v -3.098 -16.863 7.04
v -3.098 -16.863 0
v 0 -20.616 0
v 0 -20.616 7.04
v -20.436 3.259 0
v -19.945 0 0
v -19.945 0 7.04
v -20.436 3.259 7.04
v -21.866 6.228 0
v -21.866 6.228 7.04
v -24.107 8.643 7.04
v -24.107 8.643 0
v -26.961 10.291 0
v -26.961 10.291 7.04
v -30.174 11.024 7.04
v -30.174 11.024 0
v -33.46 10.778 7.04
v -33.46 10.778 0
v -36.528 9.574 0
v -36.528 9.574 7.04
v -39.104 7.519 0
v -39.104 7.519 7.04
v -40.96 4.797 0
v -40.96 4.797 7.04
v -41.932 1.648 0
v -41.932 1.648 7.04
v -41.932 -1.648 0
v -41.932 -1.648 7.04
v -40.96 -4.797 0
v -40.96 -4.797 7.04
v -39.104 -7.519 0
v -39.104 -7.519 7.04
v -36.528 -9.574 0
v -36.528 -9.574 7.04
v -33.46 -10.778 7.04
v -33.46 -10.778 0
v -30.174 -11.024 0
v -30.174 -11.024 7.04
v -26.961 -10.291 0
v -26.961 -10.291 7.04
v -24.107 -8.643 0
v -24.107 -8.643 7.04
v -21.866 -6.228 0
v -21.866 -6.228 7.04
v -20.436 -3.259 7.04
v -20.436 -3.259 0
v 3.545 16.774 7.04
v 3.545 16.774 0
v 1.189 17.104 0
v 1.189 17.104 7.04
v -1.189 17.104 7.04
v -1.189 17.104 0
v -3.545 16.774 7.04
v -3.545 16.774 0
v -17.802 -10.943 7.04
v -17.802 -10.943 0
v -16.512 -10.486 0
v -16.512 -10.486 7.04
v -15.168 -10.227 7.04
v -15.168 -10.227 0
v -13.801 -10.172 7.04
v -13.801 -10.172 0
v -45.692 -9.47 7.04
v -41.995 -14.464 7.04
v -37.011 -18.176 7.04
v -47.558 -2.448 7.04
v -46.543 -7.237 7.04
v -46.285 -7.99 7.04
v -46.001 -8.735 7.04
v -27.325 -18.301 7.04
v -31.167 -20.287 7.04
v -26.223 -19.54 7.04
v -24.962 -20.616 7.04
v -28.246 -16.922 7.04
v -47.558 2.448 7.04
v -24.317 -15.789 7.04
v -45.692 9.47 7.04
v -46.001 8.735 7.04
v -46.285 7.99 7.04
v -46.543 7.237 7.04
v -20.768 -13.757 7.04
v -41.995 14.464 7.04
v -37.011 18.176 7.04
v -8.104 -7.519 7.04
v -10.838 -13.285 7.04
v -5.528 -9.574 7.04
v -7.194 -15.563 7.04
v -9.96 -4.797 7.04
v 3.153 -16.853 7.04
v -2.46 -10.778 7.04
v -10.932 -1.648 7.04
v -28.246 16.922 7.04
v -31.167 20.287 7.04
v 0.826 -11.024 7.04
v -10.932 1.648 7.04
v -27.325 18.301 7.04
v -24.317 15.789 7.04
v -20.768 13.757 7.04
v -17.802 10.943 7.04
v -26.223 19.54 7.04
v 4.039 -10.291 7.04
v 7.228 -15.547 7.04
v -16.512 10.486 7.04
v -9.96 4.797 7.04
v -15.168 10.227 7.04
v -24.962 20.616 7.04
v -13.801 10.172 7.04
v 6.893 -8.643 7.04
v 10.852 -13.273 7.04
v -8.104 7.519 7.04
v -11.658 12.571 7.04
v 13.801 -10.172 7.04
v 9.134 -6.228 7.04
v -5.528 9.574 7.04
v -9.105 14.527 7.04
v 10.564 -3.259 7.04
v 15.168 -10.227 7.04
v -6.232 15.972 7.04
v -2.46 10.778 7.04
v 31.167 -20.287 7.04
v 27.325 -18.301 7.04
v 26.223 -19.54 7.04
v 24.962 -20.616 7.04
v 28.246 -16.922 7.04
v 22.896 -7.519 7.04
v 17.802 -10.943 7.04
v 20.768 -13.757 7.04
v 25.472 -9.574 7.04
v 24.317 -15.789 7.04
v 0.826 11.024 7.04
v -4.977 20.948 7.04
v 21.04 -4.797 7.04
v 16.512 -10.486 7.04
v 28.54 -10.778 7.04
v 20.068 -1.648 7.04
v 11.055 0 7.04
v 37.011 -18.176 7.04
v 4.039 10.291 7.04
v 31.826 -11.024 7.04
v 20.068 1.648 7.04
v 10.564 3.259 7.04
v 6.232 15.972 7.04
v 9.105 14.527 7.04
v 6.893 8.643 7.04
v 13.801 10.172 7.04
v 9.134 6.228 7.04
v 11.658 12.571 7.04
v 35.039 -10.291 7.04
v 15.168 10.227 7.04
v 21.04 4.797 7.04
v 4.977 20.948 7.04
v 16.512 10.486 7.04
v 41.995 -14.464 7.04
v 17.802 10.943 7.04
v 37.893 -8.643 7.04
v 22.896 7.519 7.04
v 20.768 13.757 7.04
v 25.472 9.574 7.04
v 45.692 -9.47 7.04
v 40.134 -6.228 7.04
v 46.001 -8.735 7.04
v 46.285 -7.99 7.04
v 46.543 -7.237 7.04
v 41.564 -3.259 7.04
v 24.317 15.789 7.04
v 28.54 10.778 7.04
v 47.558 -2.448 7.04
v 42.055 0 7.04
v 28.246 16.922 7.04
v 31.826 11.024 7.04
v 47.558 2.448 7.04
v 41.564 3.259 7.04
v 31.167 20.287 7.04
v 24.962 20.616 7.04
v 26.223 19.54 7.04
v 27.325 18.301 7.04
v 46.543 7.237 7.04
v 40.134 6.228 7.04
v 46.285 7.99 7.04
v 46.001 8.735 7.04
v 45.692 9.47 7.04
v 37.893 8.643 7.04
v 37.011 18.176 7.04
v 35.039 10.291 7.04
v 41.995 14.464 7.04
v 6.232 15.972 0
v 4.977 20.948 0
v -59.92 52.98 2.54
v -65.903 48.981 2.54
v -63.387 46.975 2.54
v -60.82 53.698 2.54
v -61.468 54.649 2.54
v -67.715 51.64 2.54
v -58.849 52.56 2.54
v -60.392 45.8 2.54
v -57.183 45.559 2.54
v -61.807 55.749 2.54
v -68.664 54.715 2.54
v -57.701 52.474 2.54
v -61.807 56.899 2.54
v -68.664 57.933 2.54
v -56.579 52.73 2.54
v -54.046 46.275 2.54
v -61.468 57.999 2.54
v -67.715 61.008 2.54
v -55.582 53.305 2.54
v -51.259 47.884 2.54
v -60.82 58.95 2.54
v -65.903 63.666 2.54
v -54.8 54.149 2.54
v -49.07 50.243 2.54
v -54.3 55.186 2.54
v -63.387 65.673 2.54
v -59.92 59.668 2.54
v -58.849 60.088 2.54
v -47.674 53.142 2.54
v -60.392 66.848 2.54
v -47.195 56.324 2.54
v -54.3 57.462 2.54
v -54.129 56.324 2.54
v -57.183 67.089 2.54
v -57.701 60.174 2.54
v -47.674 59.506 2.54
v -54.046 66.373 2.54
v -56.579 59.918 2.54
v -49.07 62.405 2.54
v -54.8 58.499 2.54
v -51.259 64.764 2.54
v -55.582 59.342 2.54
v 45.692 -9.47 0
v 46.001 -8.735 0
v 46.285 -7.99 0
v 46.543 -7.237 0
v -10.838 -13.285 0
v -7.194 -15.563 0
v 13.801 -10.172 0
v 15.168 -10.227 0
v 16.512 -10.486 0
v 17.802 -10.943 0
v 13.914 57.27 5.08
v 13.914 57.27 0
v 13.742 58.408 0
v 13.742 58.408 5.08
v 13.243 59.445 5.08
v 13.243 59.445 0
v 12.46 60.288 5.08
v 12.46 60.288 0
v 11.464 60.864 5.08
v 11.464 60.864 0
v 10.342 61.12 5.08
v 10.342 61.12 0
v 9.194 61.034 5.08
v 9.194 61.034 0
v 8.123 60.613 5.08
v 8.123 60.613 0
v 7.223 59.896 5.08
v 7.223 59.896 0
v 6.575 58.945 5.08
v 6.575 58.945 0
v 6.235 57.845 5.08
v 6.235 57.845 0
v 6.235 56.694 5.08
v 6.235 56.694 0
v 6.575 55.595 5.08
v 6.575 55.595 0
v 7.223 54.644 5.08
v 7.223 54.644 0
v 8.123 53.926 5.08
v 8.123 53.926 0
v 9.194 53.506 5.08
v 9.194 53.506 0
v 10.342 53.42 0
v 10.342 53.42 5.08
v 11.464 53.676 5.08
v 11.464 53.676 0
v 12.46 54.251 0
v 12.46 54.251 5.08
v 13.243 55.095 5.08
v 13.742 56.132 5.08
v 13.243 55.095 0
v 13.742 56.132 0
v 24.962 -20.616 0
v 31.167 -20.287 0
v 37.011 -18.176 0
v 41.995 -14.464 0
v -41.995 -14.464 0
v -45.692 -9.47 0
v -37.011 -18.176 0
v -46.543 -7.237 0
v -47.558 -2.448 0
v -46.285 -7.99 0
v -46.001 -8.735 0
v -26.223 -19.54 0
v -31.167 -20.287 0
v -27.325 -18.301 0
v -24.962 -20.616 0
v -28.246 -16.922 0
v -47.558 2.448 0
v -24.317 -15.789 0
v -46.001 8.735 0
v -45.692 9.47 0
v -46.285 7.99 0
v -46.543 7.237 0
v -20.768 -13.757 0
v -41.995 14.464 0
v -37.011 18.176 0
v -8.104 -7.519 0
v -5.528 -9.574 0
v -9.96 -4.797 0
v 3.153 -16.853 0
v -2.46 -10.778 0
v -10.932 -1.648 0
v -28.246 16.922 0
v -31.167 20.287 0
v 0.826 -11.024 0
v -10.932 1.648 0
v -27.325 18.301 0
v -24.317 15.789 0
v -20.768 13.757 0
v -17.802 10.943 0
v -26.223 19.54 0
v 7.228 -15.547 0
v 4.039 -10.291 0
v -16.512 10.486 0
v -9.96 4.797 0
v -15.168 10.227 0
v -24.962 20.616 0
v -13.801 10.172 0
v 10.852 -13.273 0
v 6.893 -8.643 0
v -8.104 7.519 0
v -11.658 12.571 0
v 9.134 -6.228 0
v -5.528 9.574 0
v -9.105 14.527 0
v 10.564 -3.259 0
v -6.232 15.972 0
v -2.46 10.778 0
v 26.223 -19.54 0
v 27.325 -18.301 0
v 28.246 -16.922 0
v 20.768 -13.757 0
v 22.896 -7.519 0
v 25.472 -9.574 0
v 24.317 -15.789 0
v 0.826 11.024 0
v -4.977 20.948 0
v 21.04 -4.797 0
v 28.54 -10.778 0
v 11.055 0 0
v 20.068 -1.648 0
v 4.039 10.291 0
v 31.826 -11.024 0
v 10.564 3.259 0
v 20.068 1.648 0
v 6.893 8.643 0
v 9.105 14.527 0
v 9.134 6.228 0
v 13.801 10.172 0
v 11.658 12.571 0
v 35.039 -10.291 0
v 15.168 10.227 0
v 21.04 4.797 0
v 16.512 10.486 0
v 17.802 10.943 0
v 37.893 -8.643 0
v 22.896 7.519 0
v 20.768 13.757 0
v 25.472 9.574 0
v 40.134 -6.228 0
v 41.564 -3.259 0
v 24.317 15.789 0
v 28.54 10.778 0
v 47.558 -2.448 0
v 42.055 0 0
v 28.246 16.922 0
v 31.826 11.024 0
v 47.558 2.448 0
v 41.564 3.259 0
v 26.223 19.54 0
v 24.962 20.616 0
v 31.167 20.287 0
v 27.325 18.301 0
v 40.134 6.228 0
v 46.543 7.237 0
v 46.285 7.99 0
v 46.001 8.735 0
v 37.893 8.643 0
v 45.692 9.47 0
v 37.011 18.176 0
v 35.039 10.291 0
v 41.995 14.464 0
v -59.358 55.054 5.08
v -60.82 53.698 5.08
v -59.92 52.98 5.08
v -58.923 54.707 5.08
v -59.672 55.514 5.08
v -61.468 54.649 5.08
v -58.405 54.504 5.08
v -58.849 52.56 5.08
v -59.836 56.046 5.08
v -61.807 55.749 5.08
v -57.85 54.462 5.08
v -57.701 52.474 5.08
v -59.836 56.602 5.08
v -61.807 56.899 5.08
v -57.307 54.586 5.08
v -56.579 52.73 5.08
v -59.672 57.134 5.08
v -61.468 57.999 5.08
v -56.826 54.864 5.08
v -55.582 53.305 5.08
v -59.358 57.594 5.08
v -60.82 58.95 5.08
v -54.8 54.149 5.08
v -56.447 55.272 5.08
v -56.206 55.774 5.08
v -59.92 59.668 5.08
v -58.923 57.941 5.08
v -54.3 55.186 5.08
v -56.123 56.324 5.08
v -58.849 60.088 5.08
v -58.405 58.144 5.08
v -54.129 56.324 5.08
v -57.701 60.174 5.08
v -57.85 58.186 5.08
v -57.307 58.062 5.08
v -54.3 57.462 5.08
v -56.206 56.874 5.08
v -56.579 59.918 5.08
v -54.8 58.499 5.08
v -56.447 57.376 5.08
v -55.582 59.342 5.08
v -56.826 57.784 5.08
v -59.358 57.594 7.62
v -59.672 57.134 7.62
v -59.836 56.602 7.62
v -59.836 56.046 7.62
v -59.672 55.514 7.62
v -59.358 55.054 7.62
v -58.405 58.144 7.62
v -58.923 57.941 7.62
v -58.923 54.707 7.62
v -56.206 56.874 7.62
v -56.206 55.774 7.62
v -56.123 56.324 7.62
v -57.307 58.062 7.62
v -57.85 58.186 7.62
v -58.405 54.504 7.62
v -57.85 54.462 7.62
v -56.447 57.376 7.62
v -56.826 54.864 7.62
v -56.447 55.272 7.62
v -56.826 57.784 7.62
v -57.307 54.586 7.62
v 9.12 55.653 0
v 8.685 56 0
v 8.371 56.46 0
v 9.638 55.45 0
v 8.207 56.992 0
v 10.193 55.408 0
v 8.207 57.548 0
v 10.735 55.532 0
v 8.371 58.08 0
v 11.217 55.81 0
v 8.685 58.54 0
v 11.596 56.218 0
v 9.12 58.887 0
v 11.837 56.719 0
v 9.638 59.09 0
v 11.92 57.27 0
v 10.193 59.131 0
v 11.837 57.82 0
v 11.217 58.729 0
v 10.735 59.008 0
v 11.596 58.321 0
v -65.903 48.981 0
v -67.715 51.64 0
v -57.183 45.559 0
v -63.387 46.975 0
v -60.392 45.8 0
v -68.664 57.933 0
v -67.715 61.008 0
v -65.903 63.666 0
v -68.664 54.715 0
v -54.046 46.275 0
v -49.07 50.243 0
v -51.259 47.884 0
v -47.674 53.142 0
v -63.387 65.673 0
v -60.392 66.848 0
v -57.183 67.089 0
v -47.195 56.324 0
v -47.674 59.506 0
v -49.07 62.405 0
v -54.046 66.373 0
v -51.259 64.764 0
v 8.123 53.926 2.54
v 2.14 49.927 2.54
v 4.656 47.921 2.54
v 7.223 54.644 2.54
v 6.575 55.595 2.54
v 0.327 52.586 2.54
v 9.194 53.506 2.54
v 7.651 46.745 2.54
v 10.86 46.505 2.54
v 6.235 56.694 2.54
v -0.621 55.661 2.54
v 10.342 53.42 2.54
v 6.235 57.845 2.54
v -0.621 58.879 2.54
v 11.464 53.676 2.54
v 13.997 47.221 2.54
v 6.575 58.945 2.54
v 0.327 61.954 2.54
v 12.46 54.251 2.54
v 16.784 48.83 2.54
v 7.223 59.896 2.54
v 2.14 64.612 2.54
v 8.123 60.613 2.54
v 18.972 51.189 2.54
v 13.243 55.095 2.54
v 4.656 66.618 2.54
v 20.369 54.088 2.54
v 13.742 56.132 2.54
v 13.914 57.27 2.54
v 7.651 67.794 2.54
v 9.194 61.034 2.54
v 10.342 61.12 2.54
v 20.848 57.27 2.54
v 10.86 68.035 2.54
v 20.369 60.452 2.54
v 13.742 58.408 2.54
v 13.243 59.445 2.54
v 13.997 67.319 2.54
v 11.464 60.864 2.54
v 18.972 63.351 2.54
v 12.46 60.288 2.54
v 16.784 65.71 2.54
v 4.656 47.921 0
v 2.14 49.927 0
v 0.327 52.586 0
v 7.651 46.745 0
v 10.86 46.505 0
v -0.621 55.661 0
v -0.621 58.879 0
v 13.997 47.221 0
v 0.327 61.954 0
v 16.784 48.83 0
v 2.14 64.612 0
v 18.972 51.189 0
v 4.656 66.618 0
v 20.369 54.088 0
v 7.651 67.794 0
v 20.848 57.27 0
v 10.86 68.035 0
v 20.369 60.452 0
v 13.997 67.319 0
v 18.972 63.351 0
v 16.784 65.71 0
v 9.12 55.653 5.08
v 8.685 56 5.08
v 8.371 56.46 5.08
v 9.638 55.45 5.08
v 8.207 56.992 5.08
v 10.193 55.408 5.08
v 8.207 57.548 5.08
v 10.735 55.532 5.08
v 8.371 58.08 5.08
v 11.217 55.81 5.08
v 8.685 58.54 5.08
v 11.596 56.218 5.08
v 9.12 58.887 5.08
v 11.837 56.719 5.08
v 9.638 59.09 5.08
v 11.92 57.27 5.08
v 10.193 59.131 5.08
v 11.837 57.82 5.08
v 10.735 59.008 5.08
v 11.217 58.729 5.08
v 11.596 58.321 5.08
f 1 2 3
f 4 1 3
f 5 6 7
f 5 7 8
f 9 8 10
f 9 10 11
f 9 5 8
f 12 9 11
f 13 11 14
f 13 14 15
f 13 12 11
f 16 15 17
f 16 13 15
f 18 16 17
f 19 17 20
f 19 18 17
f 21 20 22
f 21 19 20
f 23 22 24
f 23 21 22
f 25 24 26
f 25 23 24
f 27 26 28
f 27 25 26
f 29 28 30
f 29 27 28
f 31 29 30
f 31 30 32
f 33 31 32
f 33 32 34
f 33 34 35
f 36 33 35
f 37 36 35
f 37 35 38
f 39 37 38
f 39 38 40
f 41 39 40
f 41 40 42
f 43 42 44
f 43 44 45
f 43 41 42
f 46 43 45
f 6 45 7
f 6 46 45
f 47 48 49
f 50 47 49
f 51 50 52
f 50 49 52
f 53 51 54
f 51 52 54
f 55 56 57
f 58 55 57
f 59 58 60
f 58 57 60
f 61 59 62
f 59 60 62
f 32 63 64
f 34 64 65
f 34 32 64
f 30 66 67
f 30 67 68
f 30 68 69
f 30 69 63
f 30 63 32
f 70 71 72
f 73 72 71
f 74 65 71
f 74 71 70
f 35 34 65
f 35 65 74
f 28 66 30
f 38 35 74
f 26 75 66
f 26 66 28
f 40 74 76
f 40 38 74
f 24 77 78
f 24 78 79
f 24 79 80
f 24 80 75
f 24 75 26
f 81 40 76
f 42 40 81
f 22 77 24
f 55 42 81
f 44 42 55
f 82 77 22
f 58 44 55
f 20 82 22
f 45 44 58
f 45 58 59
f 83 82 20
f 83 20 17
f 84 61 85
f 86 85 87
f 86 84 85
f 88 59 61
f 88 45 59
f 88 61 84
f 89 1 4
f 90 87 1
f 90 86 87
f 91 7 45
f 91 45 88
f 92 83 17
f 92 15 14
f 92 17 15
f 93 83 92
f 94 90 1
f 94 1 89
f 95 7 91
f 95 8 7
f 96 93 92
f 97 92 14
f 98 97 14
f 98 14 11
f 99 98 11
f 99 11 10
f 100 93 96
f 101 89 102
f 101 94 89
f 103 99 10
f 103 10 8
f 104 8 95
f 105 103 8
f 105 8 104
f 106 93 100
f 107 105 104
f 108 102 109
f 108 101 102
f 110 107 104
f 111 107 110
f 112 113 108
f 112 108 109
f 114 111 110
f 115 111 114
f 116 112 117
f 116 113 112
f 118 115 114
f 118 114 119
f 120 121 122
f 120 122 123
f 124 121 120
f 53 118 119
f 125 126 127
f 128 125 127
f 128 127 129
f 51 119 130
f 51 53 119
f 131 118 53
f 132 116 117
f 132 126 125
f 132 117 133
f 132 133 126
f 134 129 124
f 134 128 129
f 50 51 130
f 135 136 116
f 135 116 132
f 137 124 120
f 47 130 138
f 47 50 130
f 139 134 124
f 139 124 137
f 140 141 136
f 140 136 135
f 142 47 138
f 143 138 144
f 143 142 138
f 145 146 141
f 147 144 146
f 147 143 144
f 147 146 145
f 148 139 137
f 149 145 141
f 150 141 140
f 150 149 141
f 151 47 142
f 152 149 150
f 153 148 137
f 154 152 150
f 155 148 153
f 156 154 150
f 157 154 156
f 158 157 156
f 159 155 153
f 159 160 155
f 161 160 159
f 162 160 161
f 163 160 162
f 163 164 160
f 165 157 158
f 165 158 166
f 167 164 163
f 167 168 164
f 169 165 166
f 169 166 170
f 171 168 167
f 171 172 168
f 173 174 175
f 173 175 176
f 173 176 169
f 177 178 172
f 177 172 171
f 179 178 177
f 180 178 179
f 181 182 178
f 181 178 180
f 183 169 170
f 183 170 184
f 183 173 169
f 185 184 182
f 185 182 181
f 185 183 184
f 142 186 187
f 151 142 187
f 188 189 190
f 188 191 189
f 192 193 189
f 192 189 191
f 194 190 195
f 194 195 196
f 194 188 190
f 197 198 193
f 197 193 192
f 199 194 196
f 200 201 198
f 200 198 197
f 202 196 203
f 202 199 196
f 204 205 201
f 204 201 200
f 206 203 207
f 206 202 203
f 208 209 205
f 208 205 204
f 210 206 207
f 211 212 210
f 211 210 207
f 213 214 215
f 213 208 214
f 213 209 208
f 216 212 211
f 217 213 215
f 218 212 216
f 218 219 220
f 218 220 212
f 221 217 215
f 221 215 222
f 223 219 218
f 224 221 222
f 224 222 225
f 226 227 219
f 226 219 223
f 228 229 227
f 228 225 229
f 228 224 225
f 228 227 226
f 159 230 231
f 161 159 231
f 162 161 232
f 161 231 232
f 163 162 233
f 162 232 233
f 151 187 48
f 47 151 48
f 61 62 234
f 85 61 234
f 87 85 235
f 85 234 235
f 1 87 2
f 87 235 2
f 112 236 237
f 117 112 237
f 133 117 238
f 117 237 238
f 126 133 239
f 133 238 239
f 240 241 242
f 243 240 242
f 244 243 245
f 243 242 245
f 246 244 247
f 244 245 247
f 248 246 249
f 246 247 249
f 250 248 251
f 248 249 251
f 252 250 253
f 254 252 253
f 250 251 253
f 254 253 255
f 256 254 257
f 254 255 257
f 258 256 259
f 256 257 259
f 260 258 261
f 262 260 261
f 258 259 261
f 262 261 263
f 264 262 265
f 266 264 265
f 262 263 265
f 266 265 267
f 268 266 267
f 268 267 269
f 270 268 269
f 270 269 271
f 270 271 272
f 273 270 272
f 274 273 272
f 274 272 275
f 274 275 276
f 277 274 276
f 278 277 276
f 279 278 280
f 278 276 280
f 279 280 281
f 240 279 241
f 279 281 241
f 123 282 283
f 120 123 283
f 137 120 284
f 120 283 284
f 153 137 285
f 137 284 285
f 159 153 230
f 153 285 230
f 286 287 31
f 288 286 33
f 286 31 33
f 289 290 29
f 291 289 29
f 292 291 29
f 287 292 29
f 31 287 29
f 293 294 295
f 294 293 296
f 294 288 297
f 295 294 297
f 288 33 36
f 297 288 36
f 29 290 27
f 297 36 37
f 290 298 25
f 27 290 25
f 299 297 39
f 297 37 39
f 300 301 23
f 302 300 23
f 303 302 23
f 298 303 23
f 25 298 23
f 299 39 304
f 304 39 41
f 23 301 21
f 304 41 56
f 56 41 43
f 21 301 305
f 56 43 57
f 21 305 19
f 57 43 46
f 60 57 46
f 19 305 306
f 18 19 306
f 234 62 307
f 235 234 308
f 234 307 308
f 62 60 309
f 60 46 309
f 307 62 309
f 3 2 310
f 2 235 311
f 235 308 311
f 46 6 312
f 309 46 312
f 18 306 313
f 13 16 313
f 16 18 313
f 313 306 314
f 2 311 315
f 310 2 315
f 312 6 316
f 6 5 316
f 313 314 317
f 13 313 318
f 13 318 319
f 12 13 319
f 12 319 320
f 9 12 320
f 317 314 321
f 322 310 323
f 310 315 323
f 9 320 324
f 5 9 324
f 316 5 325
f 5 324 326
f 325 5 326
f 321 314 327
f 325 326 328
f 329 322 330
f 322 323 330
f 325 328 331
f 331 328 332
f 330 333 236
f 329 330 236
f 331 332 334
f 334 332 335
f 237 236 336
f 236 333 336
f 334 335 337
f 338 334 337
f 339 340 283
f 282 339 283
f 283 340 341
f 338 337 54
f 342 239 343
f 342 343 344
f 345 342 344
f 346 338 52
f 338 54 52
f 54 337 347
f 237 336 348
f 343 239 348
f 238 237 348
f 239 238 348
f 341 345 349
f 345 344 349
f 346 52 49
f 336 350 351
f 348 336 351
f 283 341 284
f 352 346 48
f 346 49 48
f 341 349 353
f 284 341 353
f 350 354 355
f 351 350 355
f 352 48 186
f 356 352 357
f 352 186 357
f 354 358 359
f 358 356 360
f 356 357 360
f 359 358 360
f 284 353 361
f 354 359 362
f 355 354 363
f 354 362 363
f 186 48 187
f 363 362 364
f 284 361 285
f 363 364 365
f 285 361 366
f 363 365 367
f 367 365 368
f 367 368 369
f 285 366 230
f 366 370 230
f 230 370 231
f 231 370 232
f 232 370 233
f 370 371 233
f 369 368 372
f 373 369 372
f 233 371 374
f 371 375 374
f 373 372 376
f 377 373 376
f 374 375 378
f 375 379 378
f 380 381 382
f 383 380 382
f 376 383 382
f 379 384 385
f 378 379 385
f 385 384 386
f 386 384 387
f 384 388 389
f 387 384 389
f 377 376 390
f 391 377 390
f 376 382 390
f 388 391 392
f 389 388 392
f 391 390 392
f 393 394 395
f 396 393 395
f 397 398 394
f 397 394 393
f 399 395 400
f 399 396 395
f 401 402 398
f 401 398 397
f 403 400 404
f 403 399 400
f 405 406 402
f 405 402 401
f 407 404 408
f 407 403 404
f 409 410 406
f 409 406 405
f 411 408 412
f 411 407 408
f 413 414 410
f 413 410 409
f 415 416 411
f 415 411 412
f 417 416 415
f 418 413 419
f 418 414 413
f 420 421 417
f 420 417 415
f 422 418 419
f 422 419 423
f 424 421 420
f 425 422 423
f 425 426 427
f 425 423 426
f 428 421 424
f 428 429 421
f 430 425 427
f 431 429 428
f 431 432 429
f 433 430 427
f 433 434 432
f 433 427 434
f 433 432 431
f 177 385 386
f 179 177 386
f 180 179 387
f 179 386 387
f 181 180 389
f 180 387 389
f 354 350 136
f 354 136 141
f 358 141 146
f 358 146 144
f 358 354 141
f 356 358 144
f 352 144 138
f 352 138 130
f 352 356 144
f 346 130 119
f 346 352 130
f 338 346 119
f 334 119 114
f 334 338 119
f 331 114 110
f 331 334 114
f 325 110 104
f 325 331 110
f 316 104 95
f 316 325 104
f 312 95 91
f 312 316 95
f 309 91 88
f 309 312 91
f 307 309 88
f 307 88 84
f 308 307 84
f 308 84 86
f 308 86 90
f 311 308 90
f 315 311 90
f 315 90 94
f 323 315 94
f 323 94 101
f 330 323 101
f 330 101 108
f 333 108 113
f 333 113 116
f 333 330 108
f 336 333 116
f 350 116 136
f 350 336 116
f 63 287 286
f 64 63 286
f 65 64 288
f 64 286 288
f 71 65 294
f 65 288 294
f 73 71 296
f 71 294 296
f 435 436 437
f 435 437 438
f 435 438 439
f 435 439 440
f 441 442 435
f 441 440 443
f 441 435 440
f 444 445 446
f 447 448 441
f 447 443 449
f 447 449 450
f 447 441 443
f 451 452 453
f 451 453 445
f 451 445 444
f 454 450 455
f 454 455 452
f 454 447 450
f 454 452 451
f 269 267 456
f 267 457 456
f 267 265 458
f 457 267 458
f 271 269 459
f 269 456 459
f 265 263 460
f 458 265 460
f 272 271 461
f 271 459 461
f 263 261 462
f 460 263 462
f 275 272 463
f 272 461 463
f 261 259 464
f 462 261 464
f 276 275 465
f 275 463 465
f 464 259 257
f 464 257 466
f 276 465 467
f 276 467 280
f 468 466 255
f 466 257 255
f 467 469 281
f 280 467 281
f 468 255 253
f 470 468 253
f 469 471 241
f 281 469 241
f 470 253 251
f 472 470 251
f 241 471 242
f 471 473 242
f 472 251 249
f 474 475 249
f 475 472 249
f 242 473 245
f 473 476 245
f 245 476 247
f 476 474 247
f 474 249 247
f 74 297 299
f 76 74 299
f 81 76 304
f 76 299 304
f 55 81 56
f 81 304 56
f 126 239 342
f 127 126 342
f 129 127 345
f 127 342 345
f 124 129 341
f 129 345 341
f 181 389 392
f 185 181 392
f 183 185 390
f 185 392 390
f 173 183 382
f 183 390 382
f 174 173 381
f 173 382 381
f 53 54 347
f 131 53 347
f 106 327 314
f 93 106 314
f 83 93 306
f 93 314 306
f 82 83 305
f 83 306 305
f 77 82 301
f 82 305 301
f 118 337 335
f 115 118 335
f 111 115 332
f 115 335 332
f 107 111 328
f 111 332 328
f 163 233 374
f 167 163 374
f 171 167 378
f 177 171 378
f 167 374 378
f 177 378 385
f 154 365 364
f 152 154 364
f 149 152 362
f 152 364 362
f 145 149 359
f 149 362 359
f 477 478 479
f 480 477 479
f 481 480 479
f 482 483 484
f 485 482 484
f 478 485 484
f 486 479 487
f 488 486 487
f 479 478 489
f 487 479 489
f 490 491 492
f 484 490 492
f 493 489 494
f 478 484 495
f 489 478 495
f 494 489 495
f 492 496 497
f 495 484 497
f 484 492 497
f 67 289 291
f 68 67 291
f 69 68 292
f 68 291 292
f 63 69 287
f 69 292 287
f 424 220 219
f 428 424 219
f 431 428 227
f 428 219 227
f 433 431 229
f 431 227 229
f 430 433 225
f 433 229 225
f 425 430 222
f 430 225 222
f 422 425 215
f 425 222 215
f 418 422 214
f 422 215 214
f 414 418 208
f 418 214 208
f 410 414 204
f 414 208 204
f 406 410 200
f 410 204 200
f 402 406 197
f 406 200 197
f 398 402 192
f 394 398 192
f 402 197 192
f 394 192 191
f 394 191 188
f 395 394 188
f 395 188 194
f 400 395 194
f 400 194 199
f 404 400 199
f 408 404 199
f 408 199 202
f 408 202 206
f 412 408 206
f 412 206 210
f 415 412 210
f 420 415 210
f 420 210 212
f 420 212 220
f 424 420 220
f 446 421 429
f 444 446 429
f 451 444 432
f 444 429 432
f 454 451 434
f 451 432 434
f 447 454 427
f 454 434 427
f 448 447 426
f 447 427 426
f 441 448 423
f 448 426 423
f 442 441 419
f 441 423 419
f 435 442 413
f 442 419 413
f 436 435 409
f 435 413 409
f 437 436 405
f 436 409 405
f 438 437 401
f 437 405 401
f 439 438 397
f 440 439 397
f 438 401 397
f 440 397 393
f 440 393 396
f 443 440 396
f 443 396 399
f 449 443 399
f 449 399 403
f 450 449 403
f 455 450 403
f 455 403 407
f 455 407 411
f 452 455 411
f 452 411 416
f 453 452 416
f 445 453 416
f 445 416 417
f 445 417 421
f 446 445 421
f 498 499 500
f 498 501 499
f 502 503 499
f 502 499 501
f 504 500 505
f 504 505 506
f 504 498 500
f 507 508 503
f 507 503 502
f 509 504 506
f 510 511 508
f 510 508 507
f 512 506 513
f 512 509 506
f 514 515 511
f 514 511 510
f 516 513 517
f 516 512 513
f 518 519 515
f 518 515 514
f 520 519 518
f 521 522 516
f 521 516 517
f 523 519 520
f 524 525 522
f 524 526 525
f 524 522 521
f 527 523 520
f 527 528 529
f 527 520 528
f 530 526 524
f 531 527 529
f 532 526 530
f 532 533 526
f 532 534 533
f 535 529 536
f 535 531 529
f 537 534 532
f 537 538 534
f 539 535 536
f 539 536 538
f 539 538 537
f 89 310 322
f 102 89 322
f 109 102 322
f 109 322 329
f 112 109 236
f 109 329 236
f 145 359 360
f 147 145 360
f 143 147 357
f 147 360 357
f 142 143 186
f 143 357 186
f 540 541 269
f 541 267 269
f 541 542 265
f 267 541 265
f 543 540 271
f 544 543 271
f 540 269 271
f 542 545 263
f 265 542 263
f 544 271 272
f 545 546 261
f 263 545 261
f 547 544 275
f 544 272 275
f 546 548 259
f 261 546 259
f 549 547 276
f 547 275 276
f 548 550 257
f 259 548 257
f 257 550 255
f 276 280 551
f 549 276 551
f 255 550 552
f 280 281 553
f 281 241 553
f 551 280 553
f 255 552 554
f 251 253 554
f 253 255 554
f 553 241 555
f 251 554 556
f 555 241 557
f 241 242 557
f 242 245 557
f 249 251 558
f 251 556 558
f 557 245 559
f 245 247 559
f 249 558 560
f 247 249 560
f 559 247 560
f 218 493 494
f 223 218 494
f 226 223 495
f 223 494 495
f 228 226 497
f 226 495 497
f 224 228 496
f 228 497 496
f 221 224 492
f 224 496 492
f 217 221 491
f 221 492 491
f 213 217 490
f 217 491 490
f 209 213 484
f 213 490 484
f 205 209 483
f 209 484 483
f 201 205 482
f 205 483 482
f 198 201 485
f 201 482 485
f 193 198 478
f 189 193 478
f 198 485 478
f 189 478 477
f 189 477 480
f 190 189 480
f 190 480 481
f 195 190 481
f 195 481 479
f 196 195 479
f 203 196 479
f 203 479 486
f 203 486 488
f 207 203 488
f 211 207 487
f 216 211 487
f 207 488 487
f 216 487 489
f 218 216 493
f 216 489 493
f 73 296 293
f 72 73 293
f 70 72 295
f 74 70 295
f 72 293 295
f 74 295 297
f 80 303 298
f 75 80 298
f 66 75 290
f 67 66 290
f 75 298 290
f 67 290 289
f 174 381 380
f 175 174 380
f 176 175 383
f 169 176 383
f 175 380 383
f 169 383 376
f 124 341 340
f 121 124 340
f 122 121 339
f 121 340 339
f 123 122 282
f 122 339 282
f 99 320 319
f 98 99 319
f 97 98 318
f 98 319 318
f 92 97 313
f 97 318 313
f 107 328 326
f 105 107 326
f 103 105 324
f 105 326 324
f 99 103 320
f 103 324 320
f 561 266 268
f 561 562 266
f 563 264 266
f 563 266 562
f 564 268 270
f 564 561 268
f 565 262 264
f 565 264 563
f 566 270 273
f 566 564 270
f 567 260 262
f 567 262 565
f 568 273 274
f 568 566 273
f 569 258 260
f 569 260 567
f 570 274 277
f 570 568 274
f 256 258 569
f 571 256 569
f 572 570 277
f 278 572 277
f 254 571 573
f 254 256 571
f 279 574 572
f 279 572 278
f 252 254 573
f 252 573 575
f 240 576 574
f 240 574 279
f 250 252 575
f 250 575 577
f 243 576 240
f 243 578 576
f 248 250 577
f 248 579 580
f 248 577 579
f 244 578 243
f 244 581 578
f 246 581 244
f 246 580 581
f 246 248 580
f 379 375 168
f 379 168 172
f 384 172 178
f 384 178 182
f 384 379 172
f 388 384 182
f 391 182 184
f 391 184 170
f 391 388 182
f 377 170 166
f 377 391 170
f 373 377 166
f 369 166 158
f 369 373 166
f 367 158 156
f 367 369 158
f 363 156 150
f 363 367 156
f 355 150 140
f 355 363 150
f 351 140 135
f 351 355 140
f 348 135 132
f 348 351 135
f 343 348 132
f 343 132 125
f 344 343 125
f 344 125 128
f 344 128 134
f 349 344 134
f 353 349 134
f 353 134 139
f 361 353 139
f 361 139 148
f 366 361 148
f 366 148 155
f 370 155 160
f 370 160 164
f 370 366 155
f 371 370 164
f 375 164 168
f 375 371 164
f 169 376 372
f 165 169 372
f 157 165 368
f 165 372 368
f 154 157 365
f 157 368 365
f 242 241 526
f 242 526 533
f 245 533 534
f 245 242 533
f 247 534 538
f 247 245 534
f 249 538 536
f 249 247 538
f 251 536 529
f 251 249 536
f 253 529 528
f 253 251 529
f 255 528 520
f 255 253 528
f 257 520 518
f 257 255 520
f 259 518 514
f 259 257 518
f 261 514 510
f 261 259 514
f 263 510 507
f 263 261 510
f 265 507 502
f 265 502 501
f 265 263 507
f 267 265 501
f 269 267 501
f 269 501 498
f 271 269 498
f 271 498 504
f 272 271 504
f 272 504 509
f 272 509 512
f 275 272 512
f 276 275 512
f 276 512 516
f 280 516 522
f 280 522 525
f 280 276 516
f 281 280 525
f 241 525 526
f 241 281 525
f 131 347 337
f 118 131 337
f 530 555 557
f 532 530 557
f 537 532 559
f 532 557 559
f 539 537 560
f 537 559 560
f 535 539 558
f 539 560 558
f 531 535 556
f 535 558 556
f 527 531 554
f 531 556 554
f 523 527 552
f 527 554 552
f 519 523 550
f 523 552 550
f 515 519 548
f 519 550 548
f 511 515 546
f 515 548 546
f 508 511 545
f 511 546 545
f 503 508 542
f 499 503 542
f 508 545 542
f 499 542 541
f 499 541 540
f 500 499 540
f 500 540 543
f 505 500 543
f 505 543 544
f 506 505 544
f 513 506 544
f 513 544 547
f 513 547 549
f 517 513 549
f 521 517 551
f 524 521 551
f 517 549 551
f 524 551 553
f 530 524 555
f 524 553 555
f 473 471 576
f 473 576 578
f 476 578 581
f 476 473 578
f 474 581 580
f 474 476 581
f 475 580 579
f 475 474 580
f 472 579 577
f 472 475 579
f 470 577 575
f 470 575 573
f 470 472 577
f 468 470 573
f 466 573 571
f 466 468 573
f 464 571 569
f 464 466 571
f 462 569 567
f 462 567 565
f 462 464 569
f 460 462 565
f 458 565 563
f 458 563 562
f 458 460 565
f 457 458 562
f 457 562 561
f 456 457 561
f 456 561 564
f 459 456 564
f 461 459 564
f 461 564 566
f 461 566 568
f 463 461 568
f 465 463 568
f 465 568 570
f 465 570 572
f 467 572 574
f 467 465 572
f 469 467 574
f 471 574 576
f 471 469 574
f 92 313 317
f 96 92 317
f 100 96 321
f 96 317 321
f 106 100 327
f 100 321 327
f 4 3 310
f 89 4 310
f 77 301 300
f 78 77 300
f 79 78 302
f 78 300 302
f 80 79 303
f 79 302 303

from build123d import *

# Parameters (mm, degrees)
F0_R     = 11.055
F1_DEPTH = 7.04
F2_R     = 3.8608
F2_R_2   = 1.8669
F3_DEPTH = 5.08
F2_R_3   = 10.795
F4_DEPTH = 2.54
F5_DEPTH = 7.62


with BuildPart() as f1:
    # F0 (on Top) → F1 (new body)
    with BuildSketch(Plane.XY):
        with BuildLine():
            ThreePointArc((-46.5429451347, 7.2365655902), (-39.0213444379, 15.1528564439), (-28.2458606842, 16.9223444484))
            ThreePointArc((-28.2458606842, 16.9223444484), (-26.7954522093, 18.9396770038), (-24.9616837395, 20.6161639804))
            ThreePointArc((-24.9616837395, 20.6161639804), (-37.0112899435, 18.1759091976), (-45.6916782608, 9.4696636386))
            ThreePointArc((-45.6916782608, 9.4696636386), (-46.1457401666, 8.3639516727), (-46.5429451347, 7.2365655902))
        make_face()
        with BuildLine():
            ThreePointArc((-28.2458606842, -16.9223444484), (-39.0213444379, -15.1528564439), (-46.5429451347, -7.2365655902))
            ThreePointArc((-46.5429451347, -7.2365655902), (-46.1457401666, -8.3639516727), (-45.6916782608, -9.4696636386))
            ThreePointArc((-45.6916782608, -9.4696636386), (-37.0112899435, -18.1759091976), (-24.9616837395, -20.6161639804))
            ThreePointArc((-24.9616837395, -20.6161639804), (-26.7954522093, -18.9396770038), (-28.2458606842, -16.9223444484))
        make_face()
        with BuildLine():
            ThreePointArc((-13.8011629931, 10.1724591441), (-15.8450830005, 10.3315929693), (-17.8017727644, 10.9433917429))
            ThreePointArc((-17.8017727644, 10.9433917429), (-16.5374743475, 9.2079518218), (-15.5, 7.3280983208))
            ThreePointArc((-15.5, 7.3280983208), (-14.7194475205, 8.7914099944), (-13.8011629931, 10.1724591441))
        make_face()
        with BuildLine():
            ThreePointArc((-13.855, 0), (-14.27130422, 3.7552313511), (-15.5, 7.3280983208))
            ThreePointArc((-15.5, 7.3280983208), (-17.145, 0), (-15.5, -7.3280983208))
            ThreePointArc((-15.5, -7.3280983208), (-14.27130422, -3.7552313511), (-13.855, 0))
        make_face()
        with BuildLine():
            ThreePointArc((-13.8011629931, -10.1724591441), (-14.7194475205, -8.7914099944), (-15.5, -7.3280983208))
            ThreePointArc((-15.5, -7.3280983208), (-16.5374743475, -9.2079518218), (-17.8017727644, -10.9433917429))
            ThreePointArc((-17.8017727644, -10.9433917429), (-15.8450830005, -10.3315929693), (-13.8011629931, -10.1724591441))
        make_face()
        with BuildLine():
            ThreePointArc((-13.8011629931, 10.1724591441), (-14.7194475205, 8.7914099944), (-15.5, 7.3280983208))
            ThreePointArc((-15.5, 7.3280983208), (-14.27130422, 3.7552313511), (-13.855, 0))
            ThreePointArc((-13.855, 0), (-14.27130422, -3.7552313511), (-15.5, -7.3280983208))
            ThreePointArc((-15.5, -7.3280983208), (-14.7194475205, -8.7914099944), (-13.8011629931, -10.1724591441))
            ThreePointArc((-13.8011629931, -10.1724591441), (-9.0876766021, -14.5384029032), (-3.0980425219, -16.862774313))
            ThreePointArc((-3.0980425219, -16.862774313), (0.0279613173, -17.1449771993), (3.1530280548, -16.8525795974))
            ThreePointArc((3.1530280548, -16.8525795974), (9.1113748051, -14.5235627227), (13.8011629931, -10.1724591441))
            ThreePointArc((13.8011629931, -10.1724591441), (14.7194475205, -8.7914099944), (15.5, -7.3280983208))
            ThreePointArc((15.5, -7.3280983208), (13.855, 0), (15.5, 7.3280983208))
            ThreePointArc((15.5, 7.3280983208), (14.7194475205, 8.7914099944), (13.8011629931, 10.1724591441))
            ThreePointArc((13.8011629931, 10.1724591441), (10.4277783329, 13.609278601), (6.2316875055, 15.9723854146))
            ThreePointArc((6.2316875055, 15.9723854146), (4.9049913789, 16.4283926351), (3.5454552824, 16.7744082411))
            ThreePointArc((3.5454552824, 16.7744082411), (0, 17.145), (-3.5454552824, 16.7744082411))
            ThreePointArc((-3.5454552824, 16.7744082411), (-4.9049913789, 16.4283926351), (-6.2316875055, 15.9723854146))
            ThreePointArc((-6.2316875055, 15.9723854146), (-10.4277783329, 13.609278601), (-13.8011629931, 10.1724591441))
        make_face()
        Circle(F0_R, mode=Mode.SUBTRACT)
        with BuildLine():
            Line((-4.9772132188, 20.9476407617), (-6.2316875055, 15.9723854146))
            ThreePointArc((-6.2316875055, 15.9723854146), (-4.9049913789, 16.4283926351), (-3.5454552824, 16.7744082411))
            Line((-3.5454552824, 16.7744082411), (-4.9772132188, 20.9476407617))
        make_face()
        with BuildLine():
            Line((4.9772132188, 20.9476407617), (3.5454552824, 16.7744082411))
            ThreePointArc((3.5454552824, 16.7744082411), (4.9049913789, 16.4283926351), (6.2316875055, 15.9723854146))
            Line((6.2316875055, 15.9723854146), (4.9772132188, 20.9476407617))
        make_face()
        with BuildLine():
            ThreePointArc((3.1530280548, -16.8525795974), (0.0279613173, -17.1449771993), (-3.0980425219, -16.862774313))
            Line((-3.0980425219, -16.862774313), (0, -20.6161639804))
            Line((0, -20.6161639804), (3.1530280548, -16.8525795974))
        make_face()
        with BuildLine():
            ThreePointArc((15.5, 7.3280983208), (13.855, 0), (15.5, -7.3280983208))
            ThreePointArc((15.5, -7.3280983208), (16.72869578, -3.7552313511), (17.145, 0))
            ThreePointArc((17.145, 0), (16.72869578, 3.7552313511), (15.5, 7.3280983208))
        make_face()
        with BuildLine():
            ThreePointArc((17.8017727644, 10.9433917429), (15.8450830005, 10.3315929693), (13.8011629931, 10.1724591441))
            ThreePointArc((13.8011629931, 10.1724591441), (14.7194475205, 8.7914099944), (15.5, 7.3280983208))
            ThreePointArc((15.5, 7.3280983208), (16.5374743475, 9.2079518218), (17.8017727644, 10.9433917429))
        make_face()
        with BuildLine():
            ThreePointArc((15.5, -7.3280983208), (14.7194475205, -8.7914099944), (13.8011629931, -10.1724591441))
            ThreePointArc((13.8011629931, -10.1724591441), (15.8450830005, -10.3315929693), (17.8017727644, -10.9433917429))
            ThreePointArc((17.8017727644, -10.9433917429), (16.5374743475, -9.2079518218), (15.5, -7.3280983208))
        make_face()
        with BuildLine():
            ThreePointArc((17.145, 0), (16.72869578, -3.7552313511), (15.5, -7.3280983208))
            ThreePointArc((15.5, -7.3280983208), (16.5374743475, -9.2079518218), (17.8017727644, -10.9433917429))
            ThreePointArc((17.8017727644, -10.9433917429), (22.4819915173, -14.8793332004), (28.2458606842, -16.9223444484))
            ThreePointArc((28.2458606842, -16.9223444484), (39.0213444379, -15.1528564439), (46.5429451347, -7.2365655902))
            ThreePointArc((46.5429451347, -7.2365655902), (47.6858732568, 0), (46.5429451347, 7.2365655902))
            ThreePointArc((46.5429451347, 7.2365655902), (39.0213444379, 15.1528564439), (28.2458606842, 16.9223444484))
            ThreePointArc((28.2458606842, 16.9223444484), (22.4819915173, 14.8793332004), (17.8017727644, 10.9433917429))
            ThreePointArc((17.8017727644, 10.9433917429), (16.5374743475, 9.2079518218), (15.5, 7.3280983208))
            ThreePointArc((15.5, 7.3280983208), (16.72869578, 3.7552313511), (17.145, 0))
        make_face()
        with Locations((31, 0)):
            Circle(F0_R, mode=Mode.SUBTRACT)
        with BuildLine():
            ThreePointArc((24.9616837395, 20.6161639804), (26.7954522093, 18.9396770038), (28.2458606842, 16.9223444484))
            ThreePointArc((28.2458606842, 16.9223444484), (39.0213444379, 15.1528564439), (46.5429451347, 7.2365655902))
            ThreePointArc((46.5429451347, 7.2365655902), (46.1457401666, 8.3639516727), (45.6916782608, 9.4696636386))
            ThreePointArc((45.6916782608, 9.4696636386), (37.0112899435, 18.1759091976), (24.9616837395, 20.6161639804))
        make_face()
        with BuildLine():
            ThreePointArc((46.5429451347, -7.2365655902), (39.0213444379, -15.1528564439), (28.2458606842, -16.9223444484))
            ThreePointArc((28.2458606842, -16.9223444484), (26.7954522093, -18.9396770038), (24.9616837395, -20.6161639804))
            ThreePointArc((24.9616837395, -20.6161639804), (37.0112899435, -18.1759091976), (45.6916782608, -9.4696636386))
            ThreePointArc((45.6916782608, -9.4696636386), (46.1457401666, -8.3639516727), (46.5429451347, -7.2365655902))
        make_face()
        with BuildLine():
            ThreePointArc((-15.5, 7.3280983208), (-16.5374743475, 9.2079518218), (-17.8017727644, 10.9433917429))
            ThreePointArc((-17.8017727644, 10.9433917429), (-22.4819915173, 14.8793332004), (-28.2458606842, 16.9223444484))
            ThreePointArc((-28.2458606842, 16.9223444484), (-39.0213444379, 15.1528564439), (-46.5429451347, 7.2365655902))
            ThreePointArc((-46.5429451347, 7.2365655902), (-47.6858732568, 0), (-46.5429451347, -7.2365655902))
            ThreePointArc((-46.5429451347, -7.2365655902), (-39.0213444379, -15.1528564439), (-28.2458606842, -16.9223444484))
            ThreePointArc((-28.2458606842, -16.9223444484), (-22.4819915173, -14.8793332004), (-17.8017727644, -10.9433917429))
            ThreePointArc((-17.8017727644, -10.9433917429), (-16.5374743475, -9.2079518218), (-15.5, -7.3280983208))
            ThreePointArc((-15.5, -7.3280983208), (-17.145, 0), (-15.5, 7.3280983208))
        make_face()
        with Locations((-31, 0)):
            Circle(F0_R, mode=Mode.SUBTRACT)
    extrude(amount=F1_DEPTH)


with BuildPart() as f3:
    # F2 (on Top) → F3 (new body)
    with BuildSketch(Plane.XY):
        with Locations((-57.9895079136, 56.3239566982)):
            Circle(F2_R)
        with Locations((-57.9895079136, 56.3239566982)):
            Circle(F2_R_2, mode=Mode.SUBTRACT)
    extrude(amount=F3_DEPTH)

    # F2 (on Top) → F4 (join)
    with BuildSketch(Plane.XY):
        with Locations((-57.9895079136, 56.3239566982)):
            Circle(F2_R_3)
        with Locations((-57.9895079136, 56.3239566982)):
            Circle(F2_R, mode=Mode.SUBTRACT)
    extrude(amount=F4_DEPTH)

    # F2 (on Top) → F5 (join)
    with BuildSketch(Plane.XY):
        with Locations((-57.9895079136, 56.3239566982)):
            Circle(F2_R_2)
    extrude(amount=F5_DEPTH)


with BuildPart() as f3b:
    # F2 (on Top) → F3, piece 2 (new body)
    with BuildSketch(Plane.XY):
        with Locations((10.053133592, 57.2697557509)):
            Circle(F2_R)
        with Locations((10.053133592, 57.2697557509)):
            Circle(F2_R_2, mode=Mode.SUBTRACT)
    extrude(amount=F3_DEPTH)


with BuildPart() as f4:
    # F2 (on Top) → F4, piece 2 (new body)
    with BuildSketch(Plane.XY):
        with Locations((10.053133592, 57.2697557509)):
            Circle(F2_R_3)
        with Locations((10.053133592, 57.2697557509)):
            Circle(F2_R, mode=Mode.SUBTRACT)
    extrude(amount=F4_DEPTH)


solid = Compound([f1.part, f3.part, f3b.part, f4.part])
